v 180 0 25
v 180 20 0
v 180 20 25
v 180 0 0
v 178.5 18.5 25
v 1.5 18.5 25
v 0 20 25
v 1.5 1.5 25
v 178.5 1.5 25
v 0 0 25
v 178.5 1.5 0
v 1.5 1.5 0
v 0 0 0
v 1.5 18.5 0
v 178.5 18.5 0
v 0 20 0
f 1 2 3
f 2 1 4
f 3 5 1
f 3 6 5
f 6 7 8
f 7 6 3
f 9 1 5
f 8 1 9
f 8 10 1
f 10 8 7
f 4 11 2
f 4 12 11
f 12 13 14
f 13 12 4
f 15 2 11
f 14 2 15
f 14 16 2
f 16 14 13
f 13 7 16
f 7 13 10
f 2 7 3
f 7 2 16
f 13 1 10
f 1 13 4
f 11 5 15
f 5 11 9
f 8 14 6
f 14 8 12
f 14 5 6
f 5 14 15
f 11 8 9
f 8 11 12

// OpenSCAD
include <boardgame_insert_toolkit_lib.2.scad>;

// determines whether lids are output.
g_b_print_lid = true;

// determines whether boxes are output.
g_b_print_box = false; 

// Focus on one box
g_isolated_print_box = ""; 

// Used to visualize how all of the boxes fit together. 
g_b_visualization = false;          
        
// this is the outer wall thickness. 
//Default = 1.5mm
g_wall_thickness = 1.5;

// The tolerance value is extra space put between planes of the lid and box that fit together.
// Increase the tolerance to loosen the fit and decrease it to tighten it.
//
// Note that the tolerance is applied exclusively to the lid.
// So if the lid is too tight or too loose, change this value ( up for looser fit, down for tighter fit ) and 
// you only need to reprint the lid.
// 
// The exception is the stackable box, where the bottom of the box is the lid of the box below,
// in which case the tolerance also affects that box bottom.
//
g_tolerance = 0.15;

// This adjusts the position of the lid detents downward. 
// The larger the value, the bigger the gap between the lid and the box.
g_tolerance_detents_pos = 0.1;

data =
[  

    [   "bottom spacer",
        [
            [ BOX_SIZE_XYZ,[180, 20, 25] ],
            [ TYPE, SPACER]
                          
        ]
    ],
];


MakeAll();
